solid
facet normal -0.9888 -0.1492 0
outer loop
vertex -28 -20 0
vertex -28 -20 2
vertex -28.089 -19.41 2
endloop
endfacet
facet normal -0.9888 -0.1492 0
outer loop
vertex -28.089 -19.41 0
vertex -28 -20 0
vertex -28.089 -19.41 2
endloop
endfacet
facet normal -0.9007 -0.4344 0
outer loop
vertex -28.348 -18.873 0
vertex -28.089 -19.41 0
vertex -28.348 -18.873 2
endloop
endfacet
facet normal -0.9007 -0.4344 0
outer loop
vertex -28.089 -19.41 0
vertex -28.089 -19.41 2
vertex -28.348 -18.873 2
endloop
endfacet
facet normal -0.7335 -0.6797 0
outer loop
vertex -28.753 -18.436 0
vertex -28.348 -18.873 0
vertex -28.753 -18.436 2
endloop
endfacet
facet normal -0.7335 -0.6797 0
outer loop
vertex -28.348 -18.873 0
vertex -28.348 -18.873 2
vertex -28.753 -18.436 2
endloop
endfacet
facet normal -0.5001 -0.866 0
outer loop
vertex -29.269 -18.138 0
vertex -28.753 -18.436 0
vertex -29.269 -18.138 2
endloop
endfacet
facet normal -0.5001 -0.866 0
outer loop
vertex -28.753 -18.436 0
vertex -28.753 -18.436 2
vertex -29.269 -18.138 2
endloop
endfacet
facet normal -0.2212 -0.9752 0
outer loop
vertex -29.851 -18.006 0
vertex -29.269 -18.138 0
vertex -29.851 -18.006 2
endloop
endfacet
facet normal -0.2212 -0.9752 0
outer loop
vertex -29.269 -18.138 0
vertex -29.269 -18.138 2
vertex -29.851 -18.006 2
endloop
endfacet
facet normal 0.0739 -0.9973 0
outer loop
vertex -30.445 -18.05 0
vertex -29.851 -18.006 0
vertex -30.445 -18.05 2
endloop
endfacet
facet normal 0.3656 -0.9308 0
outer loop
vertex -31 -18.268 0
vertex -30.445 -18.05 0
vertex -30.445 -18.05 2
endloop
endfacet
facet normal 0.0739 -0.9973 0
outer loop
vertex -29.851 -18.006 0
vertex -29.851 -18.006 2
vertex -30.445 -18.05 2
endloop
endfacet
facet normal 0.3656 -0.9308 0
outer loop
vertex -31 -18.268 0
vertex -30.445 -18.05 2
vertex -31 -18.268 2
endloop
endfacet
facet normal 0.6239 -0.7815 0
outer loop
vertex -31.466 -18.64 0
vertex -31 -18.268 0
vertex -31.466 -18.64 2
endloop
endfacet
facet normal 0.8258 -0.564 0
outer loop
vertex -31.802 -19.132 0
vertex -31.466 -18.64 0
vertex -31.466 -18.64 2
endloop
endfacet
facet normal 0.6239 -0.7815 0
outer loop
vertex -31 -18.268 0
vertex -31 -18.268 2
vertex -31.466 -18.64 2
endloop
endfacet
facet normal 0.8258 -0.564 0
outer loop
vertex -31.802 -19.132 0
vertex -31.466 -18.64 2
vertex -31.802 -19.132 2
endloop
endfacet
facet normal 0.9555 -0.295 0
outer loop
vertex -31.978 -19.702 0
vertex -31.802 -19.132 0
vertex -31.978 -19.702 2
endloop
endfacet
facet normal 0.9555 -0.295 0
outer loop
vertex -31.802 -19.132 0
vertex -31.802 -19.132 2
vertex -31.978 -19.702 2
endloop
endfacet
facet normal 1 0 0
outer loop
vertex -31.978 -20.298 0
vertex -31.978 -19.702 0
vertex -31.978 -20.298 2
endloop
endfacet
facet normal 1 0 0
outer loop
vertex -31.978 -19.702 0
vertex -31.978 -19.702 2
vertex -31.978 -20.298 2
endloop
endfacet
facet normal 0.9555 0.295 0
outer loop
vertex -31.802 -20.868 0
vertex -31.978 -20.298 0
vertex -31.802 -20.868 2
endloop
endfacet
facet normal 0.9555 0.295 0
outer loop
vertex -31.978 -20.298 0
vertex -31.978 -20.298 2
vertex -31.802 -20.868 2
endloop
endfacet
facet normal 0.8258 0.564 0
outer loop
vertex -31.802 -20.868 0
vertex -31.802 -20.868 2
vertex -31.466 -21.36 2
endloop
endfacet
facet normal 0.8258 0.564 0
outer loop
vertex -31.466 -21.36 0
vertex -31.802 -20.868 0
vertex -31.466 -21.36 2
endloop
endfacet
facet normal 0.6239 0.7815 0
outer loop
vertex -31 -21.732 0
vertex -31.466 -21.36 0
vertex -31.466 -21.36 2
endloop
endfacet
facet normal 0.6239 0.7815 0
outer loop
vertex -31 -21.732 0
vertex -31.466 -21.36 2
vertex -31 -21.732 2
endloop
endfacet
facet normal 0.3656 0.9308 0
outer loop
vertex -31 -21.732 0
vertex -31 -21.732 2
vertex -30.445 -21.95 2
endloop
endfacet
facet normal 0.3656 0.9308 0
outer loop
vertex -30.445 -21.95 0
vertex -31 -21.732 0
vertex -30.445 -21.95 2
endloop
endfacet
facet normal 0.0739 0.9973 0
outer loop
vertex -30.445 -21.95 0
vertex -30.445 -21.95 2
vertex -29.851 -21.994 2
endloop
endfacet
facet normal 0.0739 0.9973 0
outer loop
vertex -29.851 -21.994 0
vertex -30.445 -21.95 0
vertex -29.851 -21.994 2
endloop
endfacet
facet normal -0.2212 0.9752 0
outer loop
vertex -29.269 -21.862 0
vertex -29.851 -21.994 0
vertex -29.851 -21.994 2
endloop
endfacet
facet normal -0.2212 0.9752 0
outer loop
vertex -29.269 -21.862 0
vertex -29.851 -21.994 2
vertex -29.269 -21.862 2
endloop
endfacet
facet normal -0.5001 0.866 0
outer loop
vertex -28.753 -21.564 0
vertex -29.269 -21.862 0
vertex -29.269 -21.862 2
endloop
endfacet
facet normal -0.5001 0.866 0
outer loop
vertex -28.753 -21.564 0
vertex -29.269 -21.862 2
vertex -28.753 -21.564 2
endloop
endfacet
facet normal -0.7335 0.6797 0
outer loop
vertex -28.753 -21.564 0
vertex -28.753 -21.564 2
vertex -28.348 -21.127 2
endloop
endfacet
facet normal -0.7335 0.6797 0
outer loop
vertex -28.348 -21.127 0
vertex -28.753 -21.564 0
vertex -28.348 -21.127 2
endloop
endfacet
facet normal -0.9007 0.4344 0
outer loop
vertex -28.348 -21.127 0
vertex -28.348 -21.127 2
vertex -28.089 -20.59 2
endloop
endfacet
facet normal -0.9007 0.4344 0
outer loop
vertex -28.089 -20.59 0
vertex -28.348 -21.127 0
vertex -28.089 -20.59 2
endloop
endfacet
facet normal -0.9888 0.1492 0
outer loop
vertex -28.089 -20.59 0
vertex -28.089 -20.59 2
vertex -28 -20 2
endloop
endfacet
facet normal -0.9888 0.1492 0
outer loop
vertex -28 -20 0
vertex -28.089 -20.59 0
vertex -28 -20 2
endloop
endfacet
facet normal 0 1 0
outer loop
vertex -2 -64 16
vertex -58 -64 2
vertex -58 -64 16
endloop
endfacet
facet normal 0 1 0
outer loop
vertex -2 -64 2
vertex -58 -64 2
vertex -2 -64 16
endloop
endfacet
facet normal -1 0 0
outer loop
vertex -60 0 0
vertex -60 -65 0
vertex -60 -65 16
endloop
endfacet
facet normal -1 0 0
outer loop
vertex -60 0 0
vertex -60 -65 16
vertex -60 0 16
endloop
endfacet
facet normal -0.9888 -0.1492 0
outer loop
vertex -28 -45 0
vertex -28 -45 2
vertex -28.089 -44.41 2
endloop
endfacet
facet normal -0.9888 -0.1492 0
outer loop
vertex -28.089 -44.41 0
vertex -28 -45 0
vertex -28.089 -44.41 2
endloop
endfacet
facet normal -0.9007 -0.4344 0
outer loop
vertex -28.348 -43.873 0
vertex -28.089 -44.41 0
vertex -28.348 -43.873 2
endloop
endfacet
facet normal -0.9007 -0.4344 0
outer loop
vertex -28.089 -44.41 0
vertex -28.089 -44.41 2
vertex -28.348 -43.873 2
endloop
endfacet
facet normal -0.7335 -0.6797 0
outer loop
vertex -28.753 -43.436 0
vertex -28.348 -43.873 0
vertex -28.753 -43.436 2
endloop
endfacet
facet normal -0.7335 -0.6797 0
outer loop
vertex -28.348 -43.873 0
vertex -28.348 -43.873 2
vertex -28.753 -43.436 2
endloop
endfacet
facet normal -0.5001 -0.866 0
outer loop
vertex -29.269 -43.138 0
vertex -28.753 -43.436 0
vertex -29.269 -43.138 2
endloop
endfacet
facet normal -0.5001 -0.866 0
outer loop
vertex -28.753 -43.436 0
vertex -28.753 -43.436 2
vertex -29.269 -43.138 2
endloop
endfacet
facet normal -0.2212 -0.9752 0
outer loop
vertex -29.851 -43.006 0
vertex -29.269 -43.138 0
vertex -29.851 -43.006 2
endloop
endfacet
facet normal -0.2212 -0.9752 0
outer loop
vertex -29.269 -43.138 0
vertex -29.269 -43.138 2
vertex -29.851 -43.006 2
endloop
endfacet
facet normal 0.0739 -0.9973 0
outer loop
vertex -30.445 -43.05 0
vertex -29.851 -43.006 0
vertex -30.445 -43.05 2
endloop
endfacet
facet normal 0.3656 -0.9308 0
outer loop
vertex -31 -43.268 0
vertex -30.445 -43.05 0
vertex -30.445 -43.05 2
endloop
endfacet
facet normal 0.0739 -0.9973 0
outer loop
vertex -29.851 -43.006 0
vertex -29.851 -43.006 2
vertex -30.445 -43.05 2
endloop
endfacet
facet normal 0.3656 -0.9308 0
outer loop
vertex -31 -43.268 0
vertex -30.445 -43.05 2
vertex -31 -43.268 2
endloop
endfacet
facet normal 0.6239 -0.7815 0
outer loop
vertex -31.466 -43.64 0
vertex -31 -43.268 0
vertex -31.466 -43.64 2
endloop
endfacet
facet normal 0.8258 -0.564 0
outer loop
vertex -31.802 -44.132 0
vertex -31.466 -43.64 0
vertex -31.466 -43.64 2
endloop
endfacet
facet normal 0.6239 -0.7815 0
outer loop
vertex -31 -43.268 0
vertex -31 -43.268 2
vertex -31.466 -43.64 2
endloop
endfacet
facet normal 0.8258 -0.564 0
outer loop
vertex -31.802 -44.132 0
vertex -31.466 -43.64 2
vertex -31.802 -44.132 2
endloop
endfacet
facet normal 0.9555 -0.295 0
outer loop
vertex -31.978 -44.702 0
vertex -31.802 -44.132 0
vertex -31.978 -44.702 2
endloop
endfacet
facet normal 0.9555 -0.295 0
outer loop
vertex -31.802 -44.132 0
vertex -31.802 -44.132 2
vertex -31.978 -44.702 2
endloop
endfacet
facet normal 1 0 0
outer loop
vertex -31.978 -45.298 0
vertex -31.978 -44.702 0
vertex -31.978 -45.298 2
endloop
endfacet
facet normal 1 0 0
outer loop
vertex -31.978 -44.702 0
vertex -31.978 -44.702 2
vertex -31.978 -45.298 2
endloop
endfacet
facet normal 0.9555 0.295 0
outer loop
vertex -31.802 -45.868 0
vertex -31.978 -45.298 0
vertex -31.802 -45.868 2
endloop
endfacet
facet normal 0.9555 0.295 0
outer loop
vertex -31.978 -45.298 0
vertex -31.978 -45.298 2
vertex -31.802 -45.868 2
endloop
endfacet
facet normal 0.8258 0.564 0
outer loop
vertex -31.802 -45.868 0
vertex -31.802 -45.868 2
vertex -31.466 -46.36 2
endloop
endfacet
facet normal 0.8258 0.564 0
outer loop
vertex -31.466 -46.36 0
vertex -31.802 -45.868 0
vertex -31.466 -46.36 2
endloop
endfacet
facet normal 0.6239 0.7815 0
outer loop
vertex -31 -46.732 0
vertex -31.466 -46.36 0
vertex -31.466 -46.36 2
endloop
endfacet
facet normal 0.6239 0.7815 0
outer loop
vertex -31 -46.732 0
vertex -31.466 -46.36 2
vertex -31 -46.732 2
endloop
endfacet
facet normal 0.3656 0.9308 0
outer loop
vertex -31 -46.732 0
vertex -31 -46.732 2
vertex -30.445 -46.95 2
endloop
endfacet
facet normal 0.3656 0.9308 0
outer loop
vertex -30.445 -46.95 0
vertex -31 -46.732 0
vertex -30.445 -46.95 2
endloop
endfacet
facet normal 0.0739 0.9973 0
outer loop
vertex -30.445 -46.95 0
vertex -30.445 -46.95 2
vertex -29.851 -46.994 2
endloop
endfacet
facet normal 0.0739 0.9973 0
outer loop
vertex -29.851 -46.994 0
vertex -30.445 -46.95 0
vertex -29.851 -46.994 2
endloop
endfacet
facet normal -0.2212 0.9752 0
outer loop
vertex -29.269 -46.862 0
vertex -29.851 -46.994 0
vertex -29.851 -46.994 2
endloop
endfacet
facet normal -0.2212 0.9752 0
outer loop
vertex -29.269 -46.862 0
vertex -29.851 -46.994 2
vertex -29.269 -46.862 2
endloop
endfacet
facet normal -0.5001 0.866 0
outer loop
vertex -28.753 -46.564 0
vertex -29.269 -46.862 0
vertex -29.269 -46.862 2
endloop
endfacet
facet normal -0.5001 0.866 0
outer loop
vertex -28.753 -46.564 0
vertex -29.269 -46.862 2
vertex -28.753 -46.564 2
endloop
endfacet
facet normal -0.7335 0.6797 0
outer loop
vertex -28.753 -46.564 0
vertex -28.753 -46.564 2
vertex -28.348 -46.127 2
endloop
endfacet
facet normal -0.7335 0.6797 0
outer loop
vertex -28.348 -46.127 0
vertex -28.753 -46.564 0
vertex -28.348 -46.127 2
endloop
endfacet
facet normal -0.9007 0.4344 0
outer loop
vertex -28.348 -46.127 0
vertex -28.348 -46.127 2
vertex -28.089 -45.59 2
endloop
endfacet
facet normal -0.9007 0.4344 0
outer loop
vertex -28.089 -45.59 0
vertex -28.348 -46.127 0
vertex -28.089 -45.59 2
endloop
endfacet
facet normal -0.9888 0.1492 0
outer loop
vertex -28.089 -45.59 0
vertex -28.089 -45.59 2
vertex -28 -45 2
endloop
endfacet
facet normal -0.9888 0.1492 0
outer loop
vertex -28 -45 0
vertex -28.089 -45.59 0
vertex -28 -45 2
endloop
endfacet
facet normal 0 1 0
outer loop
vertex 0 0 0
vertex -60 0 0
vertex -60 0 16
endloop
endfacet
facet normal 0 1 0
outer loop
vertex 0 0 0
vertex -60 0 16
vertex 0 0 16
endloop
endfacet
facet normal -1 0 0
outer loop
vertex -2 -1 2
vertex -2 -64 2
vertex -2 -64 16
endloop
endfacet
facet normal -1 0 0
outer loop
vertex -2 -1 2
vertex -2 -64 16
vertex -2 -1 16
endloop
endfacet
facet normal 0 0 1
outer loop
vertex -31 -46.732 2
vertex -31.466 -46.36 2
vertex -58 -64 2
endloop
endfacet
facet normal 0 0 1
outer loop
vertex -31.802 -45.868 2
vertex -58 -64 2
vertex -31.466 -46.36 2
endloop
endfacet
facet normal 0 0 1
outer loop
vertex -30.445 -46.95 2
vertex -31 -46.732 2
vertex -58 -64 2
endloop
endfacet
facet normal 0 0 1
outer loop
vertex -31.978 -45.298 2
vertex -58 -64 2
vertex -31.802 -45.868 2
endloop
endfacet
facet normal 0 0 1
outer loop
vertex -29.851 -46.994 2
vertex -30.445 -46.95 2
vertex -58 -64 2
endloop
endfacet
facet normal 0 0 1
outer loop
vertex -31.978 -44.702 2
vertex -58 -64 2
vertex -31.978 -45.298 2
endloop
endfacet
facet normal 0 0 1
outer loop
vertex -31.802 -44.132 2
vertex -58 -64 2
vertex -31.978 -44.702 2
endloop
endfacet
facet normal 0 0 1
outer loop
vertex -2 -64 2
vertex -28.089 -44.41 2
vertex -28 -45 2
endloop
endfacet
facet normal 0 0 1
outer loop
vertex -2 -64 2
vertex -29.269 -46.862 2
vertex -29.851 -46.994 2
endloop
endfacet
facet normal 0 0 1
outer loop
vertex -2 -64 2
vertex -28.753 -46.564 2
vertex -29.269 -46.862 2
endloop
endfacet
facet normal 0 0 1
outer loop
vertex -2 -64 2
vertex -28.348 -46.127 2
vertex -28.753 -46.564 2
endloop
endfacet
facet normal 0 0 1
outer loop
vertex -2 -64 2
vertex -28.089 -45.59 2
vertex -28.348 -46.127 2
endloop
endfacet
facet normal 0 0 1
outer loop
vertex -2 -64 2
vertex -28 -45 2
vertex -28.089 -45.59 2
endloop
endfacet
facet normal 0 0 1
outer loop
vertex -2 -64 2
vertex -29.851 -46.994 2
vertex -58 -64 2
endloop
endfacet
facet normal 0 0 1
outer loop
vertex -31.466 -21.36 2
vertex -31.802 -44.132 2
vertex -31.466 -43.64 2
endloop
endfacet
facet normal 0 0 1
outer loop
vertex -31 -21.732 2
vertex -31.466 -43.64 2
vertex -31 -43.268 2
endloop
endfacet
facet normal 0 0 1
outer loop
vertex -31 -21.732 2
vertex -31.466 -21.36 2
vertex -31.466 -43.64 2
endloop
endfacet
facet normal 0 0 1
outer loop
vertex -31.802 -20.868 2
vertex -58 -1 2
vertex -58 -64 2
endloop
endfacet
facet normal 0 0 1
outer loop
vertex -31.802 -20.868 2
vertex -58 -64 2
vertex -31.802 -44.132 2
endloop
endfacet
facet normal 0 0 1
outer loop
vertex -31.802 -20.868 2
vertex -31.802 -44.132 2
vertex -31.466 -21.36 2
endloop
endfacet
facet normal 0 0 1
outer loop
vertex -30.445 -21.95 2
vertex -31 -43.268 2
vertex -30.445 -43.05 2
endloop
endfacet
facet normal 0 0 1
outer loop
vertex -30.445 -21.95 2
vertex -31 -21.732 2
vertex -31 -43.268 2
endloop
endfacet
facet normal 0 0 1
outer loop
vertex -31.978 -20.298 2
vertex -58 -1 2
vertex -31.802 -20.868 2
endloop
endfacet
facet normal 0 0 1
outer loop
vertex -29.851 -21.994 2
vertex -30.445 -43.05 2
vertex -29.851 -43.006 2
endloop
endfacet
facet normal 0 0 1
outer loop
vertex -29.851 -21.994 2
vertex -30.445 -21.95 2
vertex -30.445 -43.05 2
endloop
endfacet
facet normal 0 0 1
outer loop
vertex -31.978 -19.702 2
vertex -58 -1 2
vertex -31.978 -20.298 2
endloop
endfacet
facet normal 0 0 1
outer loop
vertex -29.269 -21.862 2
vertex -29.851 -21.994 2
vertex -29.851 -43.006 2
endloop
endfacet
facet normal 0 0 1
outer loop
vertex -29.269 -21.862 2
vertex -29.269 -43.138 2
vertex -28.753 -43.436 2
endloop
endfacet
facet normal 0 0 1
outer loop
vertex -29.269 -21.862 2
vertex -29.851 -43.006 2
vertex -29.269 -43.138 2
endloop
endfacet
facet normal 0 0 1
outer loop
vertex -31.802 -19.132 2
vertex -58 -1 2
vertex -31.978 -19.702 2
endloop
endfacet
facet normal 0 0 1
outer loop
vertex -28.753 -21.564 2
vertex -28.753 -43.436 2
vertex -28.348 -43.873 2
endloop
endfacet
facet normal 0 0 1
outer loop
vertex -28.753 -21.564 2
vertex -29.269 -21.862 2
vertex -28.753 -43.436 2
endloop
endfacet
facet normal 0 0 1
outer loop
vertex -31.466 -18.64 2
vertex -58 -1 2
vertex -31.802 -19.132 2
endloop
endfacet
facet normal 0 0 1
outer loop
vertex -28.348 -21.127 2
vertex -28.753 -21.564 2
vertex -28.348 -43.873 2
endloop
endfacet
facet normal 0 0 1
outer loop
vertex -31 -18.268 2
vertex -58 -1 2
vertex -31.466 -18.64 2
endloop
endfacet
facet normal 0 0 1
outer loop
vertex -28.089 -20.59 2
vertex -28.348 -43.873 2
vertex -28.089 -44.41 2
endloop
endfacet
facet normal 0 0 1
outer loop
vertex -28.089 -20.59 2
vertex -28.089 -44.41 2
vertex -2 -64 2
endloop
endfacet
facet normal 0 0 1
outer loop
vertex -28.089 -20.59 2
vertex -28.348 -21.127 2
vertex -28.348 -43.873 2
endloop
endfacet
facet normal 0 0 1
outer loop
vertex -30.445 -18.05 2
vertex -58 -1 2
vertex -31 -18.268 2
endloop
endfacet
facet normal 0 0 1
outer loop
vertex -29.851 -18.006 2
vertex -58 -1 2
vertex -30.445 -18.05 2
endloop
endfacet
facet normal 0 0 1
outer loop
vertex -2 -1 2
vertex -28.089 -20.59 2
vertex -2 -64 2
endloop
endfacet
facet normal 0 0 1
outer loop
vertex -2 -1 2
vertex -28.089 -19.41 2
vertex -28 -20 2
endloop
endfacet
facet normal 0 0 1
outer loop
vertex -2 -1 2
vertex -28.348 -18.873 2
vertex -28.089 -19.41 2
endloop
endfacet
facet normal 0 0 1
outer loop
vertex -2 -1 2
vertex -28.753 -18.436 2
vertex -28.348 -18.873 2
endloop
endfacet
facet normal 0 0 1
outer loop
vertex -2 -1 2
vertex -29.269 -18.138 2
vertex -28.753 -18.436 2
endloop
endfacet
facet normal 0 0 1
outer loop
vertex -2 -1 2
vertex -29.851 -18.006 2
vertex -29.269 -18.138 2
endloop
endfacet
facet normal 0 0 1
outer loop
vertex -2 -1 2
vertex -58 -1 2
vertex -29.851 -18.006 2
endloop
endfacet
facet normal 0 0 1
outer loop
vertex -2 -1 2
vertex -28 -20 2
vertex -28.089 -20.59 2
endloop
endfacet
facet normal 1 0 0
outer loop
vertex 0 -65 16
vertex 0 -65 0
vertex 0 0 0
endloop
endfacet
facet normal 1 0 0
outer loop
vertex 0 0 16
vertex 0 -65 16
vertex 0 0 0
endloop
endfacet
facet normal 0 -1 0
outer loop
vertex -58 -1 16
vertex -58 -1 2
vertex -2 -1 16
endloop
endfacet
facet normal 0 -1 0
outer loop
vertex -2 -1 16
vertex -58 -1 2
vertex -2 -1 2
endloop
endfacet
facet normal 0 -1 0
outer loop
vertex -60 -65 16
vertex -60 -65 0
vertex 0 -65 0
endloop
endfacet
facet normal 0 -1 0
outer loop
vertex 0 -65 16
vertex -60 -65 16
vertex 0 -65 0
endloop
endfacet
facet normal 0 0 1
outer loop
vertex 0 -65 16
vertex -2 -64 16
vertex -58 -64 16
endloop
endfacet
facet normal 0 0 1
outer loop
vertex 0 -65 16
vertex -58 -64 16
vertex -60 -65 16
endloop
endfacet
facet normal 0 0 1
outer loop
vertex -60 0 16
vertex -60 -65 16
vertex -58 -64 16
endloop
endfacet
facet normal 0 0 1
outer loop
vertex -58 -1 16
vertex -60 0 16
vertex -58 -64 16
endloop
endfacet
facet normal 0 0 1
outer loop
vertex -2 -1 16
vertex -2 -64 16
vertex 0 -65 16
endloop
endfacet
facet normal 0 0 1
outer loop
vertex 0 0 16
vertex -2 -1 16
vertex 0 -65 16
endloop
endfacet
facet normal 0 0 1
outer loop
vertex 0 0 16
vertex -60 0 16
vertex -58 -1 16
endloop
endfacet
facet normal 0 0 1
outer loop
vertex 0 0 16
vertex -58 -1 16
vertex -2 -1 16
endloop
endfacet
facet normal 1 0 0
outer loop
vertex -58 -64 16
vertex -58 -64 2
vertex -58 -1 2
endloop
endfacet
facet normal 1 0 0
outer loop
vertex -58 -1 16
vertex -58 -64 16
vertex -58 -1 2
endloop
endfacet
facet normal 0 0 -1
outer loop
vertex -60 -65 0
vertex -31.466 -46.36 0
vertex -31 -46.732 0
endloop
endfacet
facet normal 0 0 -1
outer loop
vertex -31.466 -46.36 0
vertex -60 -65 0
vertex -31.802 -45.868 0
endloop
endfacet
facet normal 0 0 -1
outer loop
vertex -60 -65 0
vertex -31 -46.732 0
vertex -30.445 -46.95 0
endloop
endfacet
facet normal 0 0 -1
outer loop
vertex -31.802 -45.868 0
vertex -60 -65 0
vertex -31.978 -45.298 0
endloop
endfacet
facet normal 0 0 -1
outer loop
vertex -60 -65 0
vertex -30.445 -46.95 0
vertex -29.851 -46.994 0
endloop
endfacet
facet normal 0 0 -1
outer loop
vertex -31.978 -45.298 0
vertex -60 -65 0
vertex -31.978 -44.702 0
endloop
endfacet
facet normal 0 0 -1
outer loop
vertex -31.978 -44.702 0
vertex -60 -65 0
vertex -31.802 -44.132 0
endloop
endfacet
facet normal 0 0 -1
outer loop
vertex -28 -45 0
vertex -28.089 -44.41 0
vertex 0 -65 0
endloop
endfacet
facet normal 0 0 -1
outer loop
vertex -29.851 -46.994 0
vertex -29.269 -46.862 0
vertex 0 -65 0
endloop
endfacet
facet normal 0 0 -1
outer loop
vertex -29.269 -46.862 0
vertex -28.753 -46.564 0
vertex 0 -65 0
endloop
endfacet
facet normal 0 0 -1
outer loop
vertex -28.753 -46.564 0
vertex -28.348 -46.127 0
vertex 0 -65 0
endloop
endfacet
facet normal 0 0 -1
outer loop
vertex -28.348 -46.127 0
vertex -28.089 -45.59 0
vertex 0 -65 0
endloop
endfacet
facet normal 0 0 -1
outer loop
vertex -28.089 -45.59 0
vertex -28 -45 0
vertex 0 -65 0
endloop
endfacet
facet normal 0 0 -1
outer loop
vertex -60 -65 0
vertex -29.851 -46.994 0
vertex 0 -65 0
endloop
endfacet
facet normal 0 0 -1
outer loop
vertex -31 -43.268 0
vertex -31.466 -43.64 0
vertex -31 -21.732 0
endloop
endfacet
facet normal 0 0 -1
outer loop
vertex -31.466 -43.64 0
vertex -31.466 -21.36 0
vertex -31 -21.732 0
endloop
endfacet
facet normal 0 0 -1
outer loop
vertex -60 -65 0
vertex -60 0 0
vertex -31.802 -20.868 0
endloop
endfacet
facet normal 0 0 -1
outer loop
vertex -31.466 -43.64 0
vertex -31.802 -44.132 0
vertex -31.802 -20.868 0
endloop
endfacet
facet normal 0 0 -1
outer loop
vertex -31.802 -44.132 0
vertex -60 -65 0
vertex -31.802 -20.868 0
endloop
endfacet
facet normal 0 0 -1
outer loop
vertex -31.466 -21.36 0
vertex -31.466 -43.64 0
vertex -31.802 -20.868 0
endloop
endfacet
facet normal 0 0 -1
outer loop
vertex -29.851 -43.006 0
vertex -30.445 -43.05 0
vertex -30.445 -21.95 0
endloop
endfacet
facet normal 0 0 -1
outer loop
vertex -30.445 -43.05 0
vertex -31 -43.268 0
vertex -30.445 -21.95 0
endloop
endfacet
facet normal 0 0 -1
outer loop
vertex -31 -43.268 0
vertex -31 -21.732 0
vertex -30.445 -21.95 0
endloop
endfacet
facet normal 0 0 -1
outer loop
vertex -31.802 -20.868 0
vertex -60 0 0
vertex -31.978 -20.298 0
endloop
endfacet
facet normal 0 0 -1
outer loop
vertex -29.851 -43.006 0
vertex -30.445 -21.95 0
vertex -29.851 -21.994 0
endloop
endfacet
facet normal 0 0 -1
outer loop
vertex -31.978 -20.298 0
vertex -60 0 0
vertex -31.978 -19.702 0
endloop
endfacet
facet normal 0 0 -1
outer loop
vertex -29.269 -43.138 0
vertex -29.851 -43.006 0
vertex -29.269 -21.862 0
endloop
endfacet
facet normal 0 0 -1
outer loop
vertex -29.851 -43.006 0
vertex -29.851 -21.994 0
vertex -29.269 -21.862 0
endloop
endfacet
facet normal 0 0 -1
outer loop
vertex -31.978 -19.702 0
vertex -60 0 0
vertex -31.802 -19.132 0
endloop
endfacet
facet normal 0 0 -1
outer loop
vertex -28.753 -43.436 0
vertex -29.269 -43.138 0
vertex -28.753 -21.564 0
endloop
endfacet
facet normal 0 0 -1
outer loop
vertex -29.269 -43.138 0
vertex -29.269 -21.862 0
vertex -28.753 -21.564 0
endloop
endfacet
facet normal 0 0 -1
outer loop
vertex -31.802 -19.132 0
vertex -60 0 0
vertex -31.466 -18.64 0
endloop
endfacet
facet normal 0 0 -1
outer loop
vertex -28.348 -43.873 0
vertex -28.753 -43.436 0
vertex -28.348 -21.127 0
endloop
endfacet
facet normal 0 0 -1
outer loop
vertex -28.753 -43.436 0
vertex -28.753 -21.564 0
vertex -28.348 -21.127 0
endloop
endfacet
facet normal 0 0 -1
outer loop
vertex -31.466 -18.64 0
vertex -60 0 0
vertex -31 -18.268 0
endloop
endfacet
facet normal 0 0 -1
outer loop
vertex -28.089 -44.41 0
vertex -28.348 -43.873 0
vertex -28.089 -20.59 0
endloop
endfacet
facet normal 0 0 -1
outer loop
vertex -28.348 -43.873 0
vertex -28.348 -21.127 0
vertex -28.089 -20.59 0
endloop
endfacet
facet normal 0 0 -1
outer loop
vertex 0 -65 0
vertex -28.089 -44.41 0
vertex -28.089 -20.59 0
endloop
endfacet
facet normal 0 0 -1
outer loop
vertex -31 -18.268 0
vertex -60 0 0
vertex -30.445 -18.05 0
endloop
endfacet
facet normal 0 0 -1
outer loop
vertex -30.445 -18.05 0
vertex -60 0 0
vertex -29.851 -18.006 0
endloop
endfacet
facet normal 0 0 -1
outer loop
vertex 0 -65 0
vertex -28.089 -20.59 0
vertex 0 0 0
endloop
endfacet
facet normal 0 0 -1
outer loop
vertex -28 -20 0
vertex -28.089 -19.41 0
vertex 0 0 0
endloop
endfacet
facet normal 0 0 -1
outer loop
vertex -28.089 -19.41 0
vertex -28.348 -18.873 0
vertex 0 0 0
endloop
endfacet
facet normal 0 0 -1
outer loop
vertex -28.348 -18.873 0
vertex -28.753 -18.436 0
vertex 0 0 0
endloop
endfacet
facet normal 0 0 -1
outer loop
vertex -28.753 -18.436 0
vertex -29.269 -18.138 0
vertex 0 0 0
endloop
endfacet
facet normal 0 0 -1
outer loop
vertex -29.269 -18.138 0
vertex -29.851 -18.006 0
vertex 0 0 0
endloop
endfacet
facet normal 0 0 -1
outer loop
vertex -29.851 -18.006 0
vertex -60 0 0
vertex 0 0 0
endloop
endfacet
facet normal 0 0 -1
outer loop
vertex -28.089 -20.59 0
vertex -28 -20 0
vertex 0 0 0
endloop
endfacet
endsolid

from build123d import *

# Parameters (mm, degrees)
F0_W     = 56
F0_H     = 63
F1_DEPTH = 2
F0_W_2   = 60
F0_H_2   = 65
F2_DEPTH = 16
F3_R     = 2
F4_DEPTH = 25


with BuildPart() as f1:
    # F0 (on Top) → F1 (new body)
    with BuildSketch(Plane.XY):
        with Locations((-30, -32.5)):
            Rectangle(F0_W, F0_H)
    extrude(amount=F1_DEPTH)

    # F0 (on Top) → F2 (join)
    with BuildSketch(Plane.XY):
        with Locations((-30, -32.5)):
            Rectangle(F0_W_2, F0_H_2)
        with Locations((-30, -32.5)):
            Rectangle(F0_W, F0_H, mode=Mode.SUBTRACT)
    extrude(amount=F2_DEPTH)

    # F3 (on face) → F4 (cut)
    with BuildSketch(Plane.XY.offset(2)):
        with Locations((-30, -20)):
            Circle(F3_R)
        with Locations((-30, -45)):
            Circle(F3_R)
    extrude(amount=-F4_DEPTH, mode=Mode.SUBTRACT)


solid = f1.part
